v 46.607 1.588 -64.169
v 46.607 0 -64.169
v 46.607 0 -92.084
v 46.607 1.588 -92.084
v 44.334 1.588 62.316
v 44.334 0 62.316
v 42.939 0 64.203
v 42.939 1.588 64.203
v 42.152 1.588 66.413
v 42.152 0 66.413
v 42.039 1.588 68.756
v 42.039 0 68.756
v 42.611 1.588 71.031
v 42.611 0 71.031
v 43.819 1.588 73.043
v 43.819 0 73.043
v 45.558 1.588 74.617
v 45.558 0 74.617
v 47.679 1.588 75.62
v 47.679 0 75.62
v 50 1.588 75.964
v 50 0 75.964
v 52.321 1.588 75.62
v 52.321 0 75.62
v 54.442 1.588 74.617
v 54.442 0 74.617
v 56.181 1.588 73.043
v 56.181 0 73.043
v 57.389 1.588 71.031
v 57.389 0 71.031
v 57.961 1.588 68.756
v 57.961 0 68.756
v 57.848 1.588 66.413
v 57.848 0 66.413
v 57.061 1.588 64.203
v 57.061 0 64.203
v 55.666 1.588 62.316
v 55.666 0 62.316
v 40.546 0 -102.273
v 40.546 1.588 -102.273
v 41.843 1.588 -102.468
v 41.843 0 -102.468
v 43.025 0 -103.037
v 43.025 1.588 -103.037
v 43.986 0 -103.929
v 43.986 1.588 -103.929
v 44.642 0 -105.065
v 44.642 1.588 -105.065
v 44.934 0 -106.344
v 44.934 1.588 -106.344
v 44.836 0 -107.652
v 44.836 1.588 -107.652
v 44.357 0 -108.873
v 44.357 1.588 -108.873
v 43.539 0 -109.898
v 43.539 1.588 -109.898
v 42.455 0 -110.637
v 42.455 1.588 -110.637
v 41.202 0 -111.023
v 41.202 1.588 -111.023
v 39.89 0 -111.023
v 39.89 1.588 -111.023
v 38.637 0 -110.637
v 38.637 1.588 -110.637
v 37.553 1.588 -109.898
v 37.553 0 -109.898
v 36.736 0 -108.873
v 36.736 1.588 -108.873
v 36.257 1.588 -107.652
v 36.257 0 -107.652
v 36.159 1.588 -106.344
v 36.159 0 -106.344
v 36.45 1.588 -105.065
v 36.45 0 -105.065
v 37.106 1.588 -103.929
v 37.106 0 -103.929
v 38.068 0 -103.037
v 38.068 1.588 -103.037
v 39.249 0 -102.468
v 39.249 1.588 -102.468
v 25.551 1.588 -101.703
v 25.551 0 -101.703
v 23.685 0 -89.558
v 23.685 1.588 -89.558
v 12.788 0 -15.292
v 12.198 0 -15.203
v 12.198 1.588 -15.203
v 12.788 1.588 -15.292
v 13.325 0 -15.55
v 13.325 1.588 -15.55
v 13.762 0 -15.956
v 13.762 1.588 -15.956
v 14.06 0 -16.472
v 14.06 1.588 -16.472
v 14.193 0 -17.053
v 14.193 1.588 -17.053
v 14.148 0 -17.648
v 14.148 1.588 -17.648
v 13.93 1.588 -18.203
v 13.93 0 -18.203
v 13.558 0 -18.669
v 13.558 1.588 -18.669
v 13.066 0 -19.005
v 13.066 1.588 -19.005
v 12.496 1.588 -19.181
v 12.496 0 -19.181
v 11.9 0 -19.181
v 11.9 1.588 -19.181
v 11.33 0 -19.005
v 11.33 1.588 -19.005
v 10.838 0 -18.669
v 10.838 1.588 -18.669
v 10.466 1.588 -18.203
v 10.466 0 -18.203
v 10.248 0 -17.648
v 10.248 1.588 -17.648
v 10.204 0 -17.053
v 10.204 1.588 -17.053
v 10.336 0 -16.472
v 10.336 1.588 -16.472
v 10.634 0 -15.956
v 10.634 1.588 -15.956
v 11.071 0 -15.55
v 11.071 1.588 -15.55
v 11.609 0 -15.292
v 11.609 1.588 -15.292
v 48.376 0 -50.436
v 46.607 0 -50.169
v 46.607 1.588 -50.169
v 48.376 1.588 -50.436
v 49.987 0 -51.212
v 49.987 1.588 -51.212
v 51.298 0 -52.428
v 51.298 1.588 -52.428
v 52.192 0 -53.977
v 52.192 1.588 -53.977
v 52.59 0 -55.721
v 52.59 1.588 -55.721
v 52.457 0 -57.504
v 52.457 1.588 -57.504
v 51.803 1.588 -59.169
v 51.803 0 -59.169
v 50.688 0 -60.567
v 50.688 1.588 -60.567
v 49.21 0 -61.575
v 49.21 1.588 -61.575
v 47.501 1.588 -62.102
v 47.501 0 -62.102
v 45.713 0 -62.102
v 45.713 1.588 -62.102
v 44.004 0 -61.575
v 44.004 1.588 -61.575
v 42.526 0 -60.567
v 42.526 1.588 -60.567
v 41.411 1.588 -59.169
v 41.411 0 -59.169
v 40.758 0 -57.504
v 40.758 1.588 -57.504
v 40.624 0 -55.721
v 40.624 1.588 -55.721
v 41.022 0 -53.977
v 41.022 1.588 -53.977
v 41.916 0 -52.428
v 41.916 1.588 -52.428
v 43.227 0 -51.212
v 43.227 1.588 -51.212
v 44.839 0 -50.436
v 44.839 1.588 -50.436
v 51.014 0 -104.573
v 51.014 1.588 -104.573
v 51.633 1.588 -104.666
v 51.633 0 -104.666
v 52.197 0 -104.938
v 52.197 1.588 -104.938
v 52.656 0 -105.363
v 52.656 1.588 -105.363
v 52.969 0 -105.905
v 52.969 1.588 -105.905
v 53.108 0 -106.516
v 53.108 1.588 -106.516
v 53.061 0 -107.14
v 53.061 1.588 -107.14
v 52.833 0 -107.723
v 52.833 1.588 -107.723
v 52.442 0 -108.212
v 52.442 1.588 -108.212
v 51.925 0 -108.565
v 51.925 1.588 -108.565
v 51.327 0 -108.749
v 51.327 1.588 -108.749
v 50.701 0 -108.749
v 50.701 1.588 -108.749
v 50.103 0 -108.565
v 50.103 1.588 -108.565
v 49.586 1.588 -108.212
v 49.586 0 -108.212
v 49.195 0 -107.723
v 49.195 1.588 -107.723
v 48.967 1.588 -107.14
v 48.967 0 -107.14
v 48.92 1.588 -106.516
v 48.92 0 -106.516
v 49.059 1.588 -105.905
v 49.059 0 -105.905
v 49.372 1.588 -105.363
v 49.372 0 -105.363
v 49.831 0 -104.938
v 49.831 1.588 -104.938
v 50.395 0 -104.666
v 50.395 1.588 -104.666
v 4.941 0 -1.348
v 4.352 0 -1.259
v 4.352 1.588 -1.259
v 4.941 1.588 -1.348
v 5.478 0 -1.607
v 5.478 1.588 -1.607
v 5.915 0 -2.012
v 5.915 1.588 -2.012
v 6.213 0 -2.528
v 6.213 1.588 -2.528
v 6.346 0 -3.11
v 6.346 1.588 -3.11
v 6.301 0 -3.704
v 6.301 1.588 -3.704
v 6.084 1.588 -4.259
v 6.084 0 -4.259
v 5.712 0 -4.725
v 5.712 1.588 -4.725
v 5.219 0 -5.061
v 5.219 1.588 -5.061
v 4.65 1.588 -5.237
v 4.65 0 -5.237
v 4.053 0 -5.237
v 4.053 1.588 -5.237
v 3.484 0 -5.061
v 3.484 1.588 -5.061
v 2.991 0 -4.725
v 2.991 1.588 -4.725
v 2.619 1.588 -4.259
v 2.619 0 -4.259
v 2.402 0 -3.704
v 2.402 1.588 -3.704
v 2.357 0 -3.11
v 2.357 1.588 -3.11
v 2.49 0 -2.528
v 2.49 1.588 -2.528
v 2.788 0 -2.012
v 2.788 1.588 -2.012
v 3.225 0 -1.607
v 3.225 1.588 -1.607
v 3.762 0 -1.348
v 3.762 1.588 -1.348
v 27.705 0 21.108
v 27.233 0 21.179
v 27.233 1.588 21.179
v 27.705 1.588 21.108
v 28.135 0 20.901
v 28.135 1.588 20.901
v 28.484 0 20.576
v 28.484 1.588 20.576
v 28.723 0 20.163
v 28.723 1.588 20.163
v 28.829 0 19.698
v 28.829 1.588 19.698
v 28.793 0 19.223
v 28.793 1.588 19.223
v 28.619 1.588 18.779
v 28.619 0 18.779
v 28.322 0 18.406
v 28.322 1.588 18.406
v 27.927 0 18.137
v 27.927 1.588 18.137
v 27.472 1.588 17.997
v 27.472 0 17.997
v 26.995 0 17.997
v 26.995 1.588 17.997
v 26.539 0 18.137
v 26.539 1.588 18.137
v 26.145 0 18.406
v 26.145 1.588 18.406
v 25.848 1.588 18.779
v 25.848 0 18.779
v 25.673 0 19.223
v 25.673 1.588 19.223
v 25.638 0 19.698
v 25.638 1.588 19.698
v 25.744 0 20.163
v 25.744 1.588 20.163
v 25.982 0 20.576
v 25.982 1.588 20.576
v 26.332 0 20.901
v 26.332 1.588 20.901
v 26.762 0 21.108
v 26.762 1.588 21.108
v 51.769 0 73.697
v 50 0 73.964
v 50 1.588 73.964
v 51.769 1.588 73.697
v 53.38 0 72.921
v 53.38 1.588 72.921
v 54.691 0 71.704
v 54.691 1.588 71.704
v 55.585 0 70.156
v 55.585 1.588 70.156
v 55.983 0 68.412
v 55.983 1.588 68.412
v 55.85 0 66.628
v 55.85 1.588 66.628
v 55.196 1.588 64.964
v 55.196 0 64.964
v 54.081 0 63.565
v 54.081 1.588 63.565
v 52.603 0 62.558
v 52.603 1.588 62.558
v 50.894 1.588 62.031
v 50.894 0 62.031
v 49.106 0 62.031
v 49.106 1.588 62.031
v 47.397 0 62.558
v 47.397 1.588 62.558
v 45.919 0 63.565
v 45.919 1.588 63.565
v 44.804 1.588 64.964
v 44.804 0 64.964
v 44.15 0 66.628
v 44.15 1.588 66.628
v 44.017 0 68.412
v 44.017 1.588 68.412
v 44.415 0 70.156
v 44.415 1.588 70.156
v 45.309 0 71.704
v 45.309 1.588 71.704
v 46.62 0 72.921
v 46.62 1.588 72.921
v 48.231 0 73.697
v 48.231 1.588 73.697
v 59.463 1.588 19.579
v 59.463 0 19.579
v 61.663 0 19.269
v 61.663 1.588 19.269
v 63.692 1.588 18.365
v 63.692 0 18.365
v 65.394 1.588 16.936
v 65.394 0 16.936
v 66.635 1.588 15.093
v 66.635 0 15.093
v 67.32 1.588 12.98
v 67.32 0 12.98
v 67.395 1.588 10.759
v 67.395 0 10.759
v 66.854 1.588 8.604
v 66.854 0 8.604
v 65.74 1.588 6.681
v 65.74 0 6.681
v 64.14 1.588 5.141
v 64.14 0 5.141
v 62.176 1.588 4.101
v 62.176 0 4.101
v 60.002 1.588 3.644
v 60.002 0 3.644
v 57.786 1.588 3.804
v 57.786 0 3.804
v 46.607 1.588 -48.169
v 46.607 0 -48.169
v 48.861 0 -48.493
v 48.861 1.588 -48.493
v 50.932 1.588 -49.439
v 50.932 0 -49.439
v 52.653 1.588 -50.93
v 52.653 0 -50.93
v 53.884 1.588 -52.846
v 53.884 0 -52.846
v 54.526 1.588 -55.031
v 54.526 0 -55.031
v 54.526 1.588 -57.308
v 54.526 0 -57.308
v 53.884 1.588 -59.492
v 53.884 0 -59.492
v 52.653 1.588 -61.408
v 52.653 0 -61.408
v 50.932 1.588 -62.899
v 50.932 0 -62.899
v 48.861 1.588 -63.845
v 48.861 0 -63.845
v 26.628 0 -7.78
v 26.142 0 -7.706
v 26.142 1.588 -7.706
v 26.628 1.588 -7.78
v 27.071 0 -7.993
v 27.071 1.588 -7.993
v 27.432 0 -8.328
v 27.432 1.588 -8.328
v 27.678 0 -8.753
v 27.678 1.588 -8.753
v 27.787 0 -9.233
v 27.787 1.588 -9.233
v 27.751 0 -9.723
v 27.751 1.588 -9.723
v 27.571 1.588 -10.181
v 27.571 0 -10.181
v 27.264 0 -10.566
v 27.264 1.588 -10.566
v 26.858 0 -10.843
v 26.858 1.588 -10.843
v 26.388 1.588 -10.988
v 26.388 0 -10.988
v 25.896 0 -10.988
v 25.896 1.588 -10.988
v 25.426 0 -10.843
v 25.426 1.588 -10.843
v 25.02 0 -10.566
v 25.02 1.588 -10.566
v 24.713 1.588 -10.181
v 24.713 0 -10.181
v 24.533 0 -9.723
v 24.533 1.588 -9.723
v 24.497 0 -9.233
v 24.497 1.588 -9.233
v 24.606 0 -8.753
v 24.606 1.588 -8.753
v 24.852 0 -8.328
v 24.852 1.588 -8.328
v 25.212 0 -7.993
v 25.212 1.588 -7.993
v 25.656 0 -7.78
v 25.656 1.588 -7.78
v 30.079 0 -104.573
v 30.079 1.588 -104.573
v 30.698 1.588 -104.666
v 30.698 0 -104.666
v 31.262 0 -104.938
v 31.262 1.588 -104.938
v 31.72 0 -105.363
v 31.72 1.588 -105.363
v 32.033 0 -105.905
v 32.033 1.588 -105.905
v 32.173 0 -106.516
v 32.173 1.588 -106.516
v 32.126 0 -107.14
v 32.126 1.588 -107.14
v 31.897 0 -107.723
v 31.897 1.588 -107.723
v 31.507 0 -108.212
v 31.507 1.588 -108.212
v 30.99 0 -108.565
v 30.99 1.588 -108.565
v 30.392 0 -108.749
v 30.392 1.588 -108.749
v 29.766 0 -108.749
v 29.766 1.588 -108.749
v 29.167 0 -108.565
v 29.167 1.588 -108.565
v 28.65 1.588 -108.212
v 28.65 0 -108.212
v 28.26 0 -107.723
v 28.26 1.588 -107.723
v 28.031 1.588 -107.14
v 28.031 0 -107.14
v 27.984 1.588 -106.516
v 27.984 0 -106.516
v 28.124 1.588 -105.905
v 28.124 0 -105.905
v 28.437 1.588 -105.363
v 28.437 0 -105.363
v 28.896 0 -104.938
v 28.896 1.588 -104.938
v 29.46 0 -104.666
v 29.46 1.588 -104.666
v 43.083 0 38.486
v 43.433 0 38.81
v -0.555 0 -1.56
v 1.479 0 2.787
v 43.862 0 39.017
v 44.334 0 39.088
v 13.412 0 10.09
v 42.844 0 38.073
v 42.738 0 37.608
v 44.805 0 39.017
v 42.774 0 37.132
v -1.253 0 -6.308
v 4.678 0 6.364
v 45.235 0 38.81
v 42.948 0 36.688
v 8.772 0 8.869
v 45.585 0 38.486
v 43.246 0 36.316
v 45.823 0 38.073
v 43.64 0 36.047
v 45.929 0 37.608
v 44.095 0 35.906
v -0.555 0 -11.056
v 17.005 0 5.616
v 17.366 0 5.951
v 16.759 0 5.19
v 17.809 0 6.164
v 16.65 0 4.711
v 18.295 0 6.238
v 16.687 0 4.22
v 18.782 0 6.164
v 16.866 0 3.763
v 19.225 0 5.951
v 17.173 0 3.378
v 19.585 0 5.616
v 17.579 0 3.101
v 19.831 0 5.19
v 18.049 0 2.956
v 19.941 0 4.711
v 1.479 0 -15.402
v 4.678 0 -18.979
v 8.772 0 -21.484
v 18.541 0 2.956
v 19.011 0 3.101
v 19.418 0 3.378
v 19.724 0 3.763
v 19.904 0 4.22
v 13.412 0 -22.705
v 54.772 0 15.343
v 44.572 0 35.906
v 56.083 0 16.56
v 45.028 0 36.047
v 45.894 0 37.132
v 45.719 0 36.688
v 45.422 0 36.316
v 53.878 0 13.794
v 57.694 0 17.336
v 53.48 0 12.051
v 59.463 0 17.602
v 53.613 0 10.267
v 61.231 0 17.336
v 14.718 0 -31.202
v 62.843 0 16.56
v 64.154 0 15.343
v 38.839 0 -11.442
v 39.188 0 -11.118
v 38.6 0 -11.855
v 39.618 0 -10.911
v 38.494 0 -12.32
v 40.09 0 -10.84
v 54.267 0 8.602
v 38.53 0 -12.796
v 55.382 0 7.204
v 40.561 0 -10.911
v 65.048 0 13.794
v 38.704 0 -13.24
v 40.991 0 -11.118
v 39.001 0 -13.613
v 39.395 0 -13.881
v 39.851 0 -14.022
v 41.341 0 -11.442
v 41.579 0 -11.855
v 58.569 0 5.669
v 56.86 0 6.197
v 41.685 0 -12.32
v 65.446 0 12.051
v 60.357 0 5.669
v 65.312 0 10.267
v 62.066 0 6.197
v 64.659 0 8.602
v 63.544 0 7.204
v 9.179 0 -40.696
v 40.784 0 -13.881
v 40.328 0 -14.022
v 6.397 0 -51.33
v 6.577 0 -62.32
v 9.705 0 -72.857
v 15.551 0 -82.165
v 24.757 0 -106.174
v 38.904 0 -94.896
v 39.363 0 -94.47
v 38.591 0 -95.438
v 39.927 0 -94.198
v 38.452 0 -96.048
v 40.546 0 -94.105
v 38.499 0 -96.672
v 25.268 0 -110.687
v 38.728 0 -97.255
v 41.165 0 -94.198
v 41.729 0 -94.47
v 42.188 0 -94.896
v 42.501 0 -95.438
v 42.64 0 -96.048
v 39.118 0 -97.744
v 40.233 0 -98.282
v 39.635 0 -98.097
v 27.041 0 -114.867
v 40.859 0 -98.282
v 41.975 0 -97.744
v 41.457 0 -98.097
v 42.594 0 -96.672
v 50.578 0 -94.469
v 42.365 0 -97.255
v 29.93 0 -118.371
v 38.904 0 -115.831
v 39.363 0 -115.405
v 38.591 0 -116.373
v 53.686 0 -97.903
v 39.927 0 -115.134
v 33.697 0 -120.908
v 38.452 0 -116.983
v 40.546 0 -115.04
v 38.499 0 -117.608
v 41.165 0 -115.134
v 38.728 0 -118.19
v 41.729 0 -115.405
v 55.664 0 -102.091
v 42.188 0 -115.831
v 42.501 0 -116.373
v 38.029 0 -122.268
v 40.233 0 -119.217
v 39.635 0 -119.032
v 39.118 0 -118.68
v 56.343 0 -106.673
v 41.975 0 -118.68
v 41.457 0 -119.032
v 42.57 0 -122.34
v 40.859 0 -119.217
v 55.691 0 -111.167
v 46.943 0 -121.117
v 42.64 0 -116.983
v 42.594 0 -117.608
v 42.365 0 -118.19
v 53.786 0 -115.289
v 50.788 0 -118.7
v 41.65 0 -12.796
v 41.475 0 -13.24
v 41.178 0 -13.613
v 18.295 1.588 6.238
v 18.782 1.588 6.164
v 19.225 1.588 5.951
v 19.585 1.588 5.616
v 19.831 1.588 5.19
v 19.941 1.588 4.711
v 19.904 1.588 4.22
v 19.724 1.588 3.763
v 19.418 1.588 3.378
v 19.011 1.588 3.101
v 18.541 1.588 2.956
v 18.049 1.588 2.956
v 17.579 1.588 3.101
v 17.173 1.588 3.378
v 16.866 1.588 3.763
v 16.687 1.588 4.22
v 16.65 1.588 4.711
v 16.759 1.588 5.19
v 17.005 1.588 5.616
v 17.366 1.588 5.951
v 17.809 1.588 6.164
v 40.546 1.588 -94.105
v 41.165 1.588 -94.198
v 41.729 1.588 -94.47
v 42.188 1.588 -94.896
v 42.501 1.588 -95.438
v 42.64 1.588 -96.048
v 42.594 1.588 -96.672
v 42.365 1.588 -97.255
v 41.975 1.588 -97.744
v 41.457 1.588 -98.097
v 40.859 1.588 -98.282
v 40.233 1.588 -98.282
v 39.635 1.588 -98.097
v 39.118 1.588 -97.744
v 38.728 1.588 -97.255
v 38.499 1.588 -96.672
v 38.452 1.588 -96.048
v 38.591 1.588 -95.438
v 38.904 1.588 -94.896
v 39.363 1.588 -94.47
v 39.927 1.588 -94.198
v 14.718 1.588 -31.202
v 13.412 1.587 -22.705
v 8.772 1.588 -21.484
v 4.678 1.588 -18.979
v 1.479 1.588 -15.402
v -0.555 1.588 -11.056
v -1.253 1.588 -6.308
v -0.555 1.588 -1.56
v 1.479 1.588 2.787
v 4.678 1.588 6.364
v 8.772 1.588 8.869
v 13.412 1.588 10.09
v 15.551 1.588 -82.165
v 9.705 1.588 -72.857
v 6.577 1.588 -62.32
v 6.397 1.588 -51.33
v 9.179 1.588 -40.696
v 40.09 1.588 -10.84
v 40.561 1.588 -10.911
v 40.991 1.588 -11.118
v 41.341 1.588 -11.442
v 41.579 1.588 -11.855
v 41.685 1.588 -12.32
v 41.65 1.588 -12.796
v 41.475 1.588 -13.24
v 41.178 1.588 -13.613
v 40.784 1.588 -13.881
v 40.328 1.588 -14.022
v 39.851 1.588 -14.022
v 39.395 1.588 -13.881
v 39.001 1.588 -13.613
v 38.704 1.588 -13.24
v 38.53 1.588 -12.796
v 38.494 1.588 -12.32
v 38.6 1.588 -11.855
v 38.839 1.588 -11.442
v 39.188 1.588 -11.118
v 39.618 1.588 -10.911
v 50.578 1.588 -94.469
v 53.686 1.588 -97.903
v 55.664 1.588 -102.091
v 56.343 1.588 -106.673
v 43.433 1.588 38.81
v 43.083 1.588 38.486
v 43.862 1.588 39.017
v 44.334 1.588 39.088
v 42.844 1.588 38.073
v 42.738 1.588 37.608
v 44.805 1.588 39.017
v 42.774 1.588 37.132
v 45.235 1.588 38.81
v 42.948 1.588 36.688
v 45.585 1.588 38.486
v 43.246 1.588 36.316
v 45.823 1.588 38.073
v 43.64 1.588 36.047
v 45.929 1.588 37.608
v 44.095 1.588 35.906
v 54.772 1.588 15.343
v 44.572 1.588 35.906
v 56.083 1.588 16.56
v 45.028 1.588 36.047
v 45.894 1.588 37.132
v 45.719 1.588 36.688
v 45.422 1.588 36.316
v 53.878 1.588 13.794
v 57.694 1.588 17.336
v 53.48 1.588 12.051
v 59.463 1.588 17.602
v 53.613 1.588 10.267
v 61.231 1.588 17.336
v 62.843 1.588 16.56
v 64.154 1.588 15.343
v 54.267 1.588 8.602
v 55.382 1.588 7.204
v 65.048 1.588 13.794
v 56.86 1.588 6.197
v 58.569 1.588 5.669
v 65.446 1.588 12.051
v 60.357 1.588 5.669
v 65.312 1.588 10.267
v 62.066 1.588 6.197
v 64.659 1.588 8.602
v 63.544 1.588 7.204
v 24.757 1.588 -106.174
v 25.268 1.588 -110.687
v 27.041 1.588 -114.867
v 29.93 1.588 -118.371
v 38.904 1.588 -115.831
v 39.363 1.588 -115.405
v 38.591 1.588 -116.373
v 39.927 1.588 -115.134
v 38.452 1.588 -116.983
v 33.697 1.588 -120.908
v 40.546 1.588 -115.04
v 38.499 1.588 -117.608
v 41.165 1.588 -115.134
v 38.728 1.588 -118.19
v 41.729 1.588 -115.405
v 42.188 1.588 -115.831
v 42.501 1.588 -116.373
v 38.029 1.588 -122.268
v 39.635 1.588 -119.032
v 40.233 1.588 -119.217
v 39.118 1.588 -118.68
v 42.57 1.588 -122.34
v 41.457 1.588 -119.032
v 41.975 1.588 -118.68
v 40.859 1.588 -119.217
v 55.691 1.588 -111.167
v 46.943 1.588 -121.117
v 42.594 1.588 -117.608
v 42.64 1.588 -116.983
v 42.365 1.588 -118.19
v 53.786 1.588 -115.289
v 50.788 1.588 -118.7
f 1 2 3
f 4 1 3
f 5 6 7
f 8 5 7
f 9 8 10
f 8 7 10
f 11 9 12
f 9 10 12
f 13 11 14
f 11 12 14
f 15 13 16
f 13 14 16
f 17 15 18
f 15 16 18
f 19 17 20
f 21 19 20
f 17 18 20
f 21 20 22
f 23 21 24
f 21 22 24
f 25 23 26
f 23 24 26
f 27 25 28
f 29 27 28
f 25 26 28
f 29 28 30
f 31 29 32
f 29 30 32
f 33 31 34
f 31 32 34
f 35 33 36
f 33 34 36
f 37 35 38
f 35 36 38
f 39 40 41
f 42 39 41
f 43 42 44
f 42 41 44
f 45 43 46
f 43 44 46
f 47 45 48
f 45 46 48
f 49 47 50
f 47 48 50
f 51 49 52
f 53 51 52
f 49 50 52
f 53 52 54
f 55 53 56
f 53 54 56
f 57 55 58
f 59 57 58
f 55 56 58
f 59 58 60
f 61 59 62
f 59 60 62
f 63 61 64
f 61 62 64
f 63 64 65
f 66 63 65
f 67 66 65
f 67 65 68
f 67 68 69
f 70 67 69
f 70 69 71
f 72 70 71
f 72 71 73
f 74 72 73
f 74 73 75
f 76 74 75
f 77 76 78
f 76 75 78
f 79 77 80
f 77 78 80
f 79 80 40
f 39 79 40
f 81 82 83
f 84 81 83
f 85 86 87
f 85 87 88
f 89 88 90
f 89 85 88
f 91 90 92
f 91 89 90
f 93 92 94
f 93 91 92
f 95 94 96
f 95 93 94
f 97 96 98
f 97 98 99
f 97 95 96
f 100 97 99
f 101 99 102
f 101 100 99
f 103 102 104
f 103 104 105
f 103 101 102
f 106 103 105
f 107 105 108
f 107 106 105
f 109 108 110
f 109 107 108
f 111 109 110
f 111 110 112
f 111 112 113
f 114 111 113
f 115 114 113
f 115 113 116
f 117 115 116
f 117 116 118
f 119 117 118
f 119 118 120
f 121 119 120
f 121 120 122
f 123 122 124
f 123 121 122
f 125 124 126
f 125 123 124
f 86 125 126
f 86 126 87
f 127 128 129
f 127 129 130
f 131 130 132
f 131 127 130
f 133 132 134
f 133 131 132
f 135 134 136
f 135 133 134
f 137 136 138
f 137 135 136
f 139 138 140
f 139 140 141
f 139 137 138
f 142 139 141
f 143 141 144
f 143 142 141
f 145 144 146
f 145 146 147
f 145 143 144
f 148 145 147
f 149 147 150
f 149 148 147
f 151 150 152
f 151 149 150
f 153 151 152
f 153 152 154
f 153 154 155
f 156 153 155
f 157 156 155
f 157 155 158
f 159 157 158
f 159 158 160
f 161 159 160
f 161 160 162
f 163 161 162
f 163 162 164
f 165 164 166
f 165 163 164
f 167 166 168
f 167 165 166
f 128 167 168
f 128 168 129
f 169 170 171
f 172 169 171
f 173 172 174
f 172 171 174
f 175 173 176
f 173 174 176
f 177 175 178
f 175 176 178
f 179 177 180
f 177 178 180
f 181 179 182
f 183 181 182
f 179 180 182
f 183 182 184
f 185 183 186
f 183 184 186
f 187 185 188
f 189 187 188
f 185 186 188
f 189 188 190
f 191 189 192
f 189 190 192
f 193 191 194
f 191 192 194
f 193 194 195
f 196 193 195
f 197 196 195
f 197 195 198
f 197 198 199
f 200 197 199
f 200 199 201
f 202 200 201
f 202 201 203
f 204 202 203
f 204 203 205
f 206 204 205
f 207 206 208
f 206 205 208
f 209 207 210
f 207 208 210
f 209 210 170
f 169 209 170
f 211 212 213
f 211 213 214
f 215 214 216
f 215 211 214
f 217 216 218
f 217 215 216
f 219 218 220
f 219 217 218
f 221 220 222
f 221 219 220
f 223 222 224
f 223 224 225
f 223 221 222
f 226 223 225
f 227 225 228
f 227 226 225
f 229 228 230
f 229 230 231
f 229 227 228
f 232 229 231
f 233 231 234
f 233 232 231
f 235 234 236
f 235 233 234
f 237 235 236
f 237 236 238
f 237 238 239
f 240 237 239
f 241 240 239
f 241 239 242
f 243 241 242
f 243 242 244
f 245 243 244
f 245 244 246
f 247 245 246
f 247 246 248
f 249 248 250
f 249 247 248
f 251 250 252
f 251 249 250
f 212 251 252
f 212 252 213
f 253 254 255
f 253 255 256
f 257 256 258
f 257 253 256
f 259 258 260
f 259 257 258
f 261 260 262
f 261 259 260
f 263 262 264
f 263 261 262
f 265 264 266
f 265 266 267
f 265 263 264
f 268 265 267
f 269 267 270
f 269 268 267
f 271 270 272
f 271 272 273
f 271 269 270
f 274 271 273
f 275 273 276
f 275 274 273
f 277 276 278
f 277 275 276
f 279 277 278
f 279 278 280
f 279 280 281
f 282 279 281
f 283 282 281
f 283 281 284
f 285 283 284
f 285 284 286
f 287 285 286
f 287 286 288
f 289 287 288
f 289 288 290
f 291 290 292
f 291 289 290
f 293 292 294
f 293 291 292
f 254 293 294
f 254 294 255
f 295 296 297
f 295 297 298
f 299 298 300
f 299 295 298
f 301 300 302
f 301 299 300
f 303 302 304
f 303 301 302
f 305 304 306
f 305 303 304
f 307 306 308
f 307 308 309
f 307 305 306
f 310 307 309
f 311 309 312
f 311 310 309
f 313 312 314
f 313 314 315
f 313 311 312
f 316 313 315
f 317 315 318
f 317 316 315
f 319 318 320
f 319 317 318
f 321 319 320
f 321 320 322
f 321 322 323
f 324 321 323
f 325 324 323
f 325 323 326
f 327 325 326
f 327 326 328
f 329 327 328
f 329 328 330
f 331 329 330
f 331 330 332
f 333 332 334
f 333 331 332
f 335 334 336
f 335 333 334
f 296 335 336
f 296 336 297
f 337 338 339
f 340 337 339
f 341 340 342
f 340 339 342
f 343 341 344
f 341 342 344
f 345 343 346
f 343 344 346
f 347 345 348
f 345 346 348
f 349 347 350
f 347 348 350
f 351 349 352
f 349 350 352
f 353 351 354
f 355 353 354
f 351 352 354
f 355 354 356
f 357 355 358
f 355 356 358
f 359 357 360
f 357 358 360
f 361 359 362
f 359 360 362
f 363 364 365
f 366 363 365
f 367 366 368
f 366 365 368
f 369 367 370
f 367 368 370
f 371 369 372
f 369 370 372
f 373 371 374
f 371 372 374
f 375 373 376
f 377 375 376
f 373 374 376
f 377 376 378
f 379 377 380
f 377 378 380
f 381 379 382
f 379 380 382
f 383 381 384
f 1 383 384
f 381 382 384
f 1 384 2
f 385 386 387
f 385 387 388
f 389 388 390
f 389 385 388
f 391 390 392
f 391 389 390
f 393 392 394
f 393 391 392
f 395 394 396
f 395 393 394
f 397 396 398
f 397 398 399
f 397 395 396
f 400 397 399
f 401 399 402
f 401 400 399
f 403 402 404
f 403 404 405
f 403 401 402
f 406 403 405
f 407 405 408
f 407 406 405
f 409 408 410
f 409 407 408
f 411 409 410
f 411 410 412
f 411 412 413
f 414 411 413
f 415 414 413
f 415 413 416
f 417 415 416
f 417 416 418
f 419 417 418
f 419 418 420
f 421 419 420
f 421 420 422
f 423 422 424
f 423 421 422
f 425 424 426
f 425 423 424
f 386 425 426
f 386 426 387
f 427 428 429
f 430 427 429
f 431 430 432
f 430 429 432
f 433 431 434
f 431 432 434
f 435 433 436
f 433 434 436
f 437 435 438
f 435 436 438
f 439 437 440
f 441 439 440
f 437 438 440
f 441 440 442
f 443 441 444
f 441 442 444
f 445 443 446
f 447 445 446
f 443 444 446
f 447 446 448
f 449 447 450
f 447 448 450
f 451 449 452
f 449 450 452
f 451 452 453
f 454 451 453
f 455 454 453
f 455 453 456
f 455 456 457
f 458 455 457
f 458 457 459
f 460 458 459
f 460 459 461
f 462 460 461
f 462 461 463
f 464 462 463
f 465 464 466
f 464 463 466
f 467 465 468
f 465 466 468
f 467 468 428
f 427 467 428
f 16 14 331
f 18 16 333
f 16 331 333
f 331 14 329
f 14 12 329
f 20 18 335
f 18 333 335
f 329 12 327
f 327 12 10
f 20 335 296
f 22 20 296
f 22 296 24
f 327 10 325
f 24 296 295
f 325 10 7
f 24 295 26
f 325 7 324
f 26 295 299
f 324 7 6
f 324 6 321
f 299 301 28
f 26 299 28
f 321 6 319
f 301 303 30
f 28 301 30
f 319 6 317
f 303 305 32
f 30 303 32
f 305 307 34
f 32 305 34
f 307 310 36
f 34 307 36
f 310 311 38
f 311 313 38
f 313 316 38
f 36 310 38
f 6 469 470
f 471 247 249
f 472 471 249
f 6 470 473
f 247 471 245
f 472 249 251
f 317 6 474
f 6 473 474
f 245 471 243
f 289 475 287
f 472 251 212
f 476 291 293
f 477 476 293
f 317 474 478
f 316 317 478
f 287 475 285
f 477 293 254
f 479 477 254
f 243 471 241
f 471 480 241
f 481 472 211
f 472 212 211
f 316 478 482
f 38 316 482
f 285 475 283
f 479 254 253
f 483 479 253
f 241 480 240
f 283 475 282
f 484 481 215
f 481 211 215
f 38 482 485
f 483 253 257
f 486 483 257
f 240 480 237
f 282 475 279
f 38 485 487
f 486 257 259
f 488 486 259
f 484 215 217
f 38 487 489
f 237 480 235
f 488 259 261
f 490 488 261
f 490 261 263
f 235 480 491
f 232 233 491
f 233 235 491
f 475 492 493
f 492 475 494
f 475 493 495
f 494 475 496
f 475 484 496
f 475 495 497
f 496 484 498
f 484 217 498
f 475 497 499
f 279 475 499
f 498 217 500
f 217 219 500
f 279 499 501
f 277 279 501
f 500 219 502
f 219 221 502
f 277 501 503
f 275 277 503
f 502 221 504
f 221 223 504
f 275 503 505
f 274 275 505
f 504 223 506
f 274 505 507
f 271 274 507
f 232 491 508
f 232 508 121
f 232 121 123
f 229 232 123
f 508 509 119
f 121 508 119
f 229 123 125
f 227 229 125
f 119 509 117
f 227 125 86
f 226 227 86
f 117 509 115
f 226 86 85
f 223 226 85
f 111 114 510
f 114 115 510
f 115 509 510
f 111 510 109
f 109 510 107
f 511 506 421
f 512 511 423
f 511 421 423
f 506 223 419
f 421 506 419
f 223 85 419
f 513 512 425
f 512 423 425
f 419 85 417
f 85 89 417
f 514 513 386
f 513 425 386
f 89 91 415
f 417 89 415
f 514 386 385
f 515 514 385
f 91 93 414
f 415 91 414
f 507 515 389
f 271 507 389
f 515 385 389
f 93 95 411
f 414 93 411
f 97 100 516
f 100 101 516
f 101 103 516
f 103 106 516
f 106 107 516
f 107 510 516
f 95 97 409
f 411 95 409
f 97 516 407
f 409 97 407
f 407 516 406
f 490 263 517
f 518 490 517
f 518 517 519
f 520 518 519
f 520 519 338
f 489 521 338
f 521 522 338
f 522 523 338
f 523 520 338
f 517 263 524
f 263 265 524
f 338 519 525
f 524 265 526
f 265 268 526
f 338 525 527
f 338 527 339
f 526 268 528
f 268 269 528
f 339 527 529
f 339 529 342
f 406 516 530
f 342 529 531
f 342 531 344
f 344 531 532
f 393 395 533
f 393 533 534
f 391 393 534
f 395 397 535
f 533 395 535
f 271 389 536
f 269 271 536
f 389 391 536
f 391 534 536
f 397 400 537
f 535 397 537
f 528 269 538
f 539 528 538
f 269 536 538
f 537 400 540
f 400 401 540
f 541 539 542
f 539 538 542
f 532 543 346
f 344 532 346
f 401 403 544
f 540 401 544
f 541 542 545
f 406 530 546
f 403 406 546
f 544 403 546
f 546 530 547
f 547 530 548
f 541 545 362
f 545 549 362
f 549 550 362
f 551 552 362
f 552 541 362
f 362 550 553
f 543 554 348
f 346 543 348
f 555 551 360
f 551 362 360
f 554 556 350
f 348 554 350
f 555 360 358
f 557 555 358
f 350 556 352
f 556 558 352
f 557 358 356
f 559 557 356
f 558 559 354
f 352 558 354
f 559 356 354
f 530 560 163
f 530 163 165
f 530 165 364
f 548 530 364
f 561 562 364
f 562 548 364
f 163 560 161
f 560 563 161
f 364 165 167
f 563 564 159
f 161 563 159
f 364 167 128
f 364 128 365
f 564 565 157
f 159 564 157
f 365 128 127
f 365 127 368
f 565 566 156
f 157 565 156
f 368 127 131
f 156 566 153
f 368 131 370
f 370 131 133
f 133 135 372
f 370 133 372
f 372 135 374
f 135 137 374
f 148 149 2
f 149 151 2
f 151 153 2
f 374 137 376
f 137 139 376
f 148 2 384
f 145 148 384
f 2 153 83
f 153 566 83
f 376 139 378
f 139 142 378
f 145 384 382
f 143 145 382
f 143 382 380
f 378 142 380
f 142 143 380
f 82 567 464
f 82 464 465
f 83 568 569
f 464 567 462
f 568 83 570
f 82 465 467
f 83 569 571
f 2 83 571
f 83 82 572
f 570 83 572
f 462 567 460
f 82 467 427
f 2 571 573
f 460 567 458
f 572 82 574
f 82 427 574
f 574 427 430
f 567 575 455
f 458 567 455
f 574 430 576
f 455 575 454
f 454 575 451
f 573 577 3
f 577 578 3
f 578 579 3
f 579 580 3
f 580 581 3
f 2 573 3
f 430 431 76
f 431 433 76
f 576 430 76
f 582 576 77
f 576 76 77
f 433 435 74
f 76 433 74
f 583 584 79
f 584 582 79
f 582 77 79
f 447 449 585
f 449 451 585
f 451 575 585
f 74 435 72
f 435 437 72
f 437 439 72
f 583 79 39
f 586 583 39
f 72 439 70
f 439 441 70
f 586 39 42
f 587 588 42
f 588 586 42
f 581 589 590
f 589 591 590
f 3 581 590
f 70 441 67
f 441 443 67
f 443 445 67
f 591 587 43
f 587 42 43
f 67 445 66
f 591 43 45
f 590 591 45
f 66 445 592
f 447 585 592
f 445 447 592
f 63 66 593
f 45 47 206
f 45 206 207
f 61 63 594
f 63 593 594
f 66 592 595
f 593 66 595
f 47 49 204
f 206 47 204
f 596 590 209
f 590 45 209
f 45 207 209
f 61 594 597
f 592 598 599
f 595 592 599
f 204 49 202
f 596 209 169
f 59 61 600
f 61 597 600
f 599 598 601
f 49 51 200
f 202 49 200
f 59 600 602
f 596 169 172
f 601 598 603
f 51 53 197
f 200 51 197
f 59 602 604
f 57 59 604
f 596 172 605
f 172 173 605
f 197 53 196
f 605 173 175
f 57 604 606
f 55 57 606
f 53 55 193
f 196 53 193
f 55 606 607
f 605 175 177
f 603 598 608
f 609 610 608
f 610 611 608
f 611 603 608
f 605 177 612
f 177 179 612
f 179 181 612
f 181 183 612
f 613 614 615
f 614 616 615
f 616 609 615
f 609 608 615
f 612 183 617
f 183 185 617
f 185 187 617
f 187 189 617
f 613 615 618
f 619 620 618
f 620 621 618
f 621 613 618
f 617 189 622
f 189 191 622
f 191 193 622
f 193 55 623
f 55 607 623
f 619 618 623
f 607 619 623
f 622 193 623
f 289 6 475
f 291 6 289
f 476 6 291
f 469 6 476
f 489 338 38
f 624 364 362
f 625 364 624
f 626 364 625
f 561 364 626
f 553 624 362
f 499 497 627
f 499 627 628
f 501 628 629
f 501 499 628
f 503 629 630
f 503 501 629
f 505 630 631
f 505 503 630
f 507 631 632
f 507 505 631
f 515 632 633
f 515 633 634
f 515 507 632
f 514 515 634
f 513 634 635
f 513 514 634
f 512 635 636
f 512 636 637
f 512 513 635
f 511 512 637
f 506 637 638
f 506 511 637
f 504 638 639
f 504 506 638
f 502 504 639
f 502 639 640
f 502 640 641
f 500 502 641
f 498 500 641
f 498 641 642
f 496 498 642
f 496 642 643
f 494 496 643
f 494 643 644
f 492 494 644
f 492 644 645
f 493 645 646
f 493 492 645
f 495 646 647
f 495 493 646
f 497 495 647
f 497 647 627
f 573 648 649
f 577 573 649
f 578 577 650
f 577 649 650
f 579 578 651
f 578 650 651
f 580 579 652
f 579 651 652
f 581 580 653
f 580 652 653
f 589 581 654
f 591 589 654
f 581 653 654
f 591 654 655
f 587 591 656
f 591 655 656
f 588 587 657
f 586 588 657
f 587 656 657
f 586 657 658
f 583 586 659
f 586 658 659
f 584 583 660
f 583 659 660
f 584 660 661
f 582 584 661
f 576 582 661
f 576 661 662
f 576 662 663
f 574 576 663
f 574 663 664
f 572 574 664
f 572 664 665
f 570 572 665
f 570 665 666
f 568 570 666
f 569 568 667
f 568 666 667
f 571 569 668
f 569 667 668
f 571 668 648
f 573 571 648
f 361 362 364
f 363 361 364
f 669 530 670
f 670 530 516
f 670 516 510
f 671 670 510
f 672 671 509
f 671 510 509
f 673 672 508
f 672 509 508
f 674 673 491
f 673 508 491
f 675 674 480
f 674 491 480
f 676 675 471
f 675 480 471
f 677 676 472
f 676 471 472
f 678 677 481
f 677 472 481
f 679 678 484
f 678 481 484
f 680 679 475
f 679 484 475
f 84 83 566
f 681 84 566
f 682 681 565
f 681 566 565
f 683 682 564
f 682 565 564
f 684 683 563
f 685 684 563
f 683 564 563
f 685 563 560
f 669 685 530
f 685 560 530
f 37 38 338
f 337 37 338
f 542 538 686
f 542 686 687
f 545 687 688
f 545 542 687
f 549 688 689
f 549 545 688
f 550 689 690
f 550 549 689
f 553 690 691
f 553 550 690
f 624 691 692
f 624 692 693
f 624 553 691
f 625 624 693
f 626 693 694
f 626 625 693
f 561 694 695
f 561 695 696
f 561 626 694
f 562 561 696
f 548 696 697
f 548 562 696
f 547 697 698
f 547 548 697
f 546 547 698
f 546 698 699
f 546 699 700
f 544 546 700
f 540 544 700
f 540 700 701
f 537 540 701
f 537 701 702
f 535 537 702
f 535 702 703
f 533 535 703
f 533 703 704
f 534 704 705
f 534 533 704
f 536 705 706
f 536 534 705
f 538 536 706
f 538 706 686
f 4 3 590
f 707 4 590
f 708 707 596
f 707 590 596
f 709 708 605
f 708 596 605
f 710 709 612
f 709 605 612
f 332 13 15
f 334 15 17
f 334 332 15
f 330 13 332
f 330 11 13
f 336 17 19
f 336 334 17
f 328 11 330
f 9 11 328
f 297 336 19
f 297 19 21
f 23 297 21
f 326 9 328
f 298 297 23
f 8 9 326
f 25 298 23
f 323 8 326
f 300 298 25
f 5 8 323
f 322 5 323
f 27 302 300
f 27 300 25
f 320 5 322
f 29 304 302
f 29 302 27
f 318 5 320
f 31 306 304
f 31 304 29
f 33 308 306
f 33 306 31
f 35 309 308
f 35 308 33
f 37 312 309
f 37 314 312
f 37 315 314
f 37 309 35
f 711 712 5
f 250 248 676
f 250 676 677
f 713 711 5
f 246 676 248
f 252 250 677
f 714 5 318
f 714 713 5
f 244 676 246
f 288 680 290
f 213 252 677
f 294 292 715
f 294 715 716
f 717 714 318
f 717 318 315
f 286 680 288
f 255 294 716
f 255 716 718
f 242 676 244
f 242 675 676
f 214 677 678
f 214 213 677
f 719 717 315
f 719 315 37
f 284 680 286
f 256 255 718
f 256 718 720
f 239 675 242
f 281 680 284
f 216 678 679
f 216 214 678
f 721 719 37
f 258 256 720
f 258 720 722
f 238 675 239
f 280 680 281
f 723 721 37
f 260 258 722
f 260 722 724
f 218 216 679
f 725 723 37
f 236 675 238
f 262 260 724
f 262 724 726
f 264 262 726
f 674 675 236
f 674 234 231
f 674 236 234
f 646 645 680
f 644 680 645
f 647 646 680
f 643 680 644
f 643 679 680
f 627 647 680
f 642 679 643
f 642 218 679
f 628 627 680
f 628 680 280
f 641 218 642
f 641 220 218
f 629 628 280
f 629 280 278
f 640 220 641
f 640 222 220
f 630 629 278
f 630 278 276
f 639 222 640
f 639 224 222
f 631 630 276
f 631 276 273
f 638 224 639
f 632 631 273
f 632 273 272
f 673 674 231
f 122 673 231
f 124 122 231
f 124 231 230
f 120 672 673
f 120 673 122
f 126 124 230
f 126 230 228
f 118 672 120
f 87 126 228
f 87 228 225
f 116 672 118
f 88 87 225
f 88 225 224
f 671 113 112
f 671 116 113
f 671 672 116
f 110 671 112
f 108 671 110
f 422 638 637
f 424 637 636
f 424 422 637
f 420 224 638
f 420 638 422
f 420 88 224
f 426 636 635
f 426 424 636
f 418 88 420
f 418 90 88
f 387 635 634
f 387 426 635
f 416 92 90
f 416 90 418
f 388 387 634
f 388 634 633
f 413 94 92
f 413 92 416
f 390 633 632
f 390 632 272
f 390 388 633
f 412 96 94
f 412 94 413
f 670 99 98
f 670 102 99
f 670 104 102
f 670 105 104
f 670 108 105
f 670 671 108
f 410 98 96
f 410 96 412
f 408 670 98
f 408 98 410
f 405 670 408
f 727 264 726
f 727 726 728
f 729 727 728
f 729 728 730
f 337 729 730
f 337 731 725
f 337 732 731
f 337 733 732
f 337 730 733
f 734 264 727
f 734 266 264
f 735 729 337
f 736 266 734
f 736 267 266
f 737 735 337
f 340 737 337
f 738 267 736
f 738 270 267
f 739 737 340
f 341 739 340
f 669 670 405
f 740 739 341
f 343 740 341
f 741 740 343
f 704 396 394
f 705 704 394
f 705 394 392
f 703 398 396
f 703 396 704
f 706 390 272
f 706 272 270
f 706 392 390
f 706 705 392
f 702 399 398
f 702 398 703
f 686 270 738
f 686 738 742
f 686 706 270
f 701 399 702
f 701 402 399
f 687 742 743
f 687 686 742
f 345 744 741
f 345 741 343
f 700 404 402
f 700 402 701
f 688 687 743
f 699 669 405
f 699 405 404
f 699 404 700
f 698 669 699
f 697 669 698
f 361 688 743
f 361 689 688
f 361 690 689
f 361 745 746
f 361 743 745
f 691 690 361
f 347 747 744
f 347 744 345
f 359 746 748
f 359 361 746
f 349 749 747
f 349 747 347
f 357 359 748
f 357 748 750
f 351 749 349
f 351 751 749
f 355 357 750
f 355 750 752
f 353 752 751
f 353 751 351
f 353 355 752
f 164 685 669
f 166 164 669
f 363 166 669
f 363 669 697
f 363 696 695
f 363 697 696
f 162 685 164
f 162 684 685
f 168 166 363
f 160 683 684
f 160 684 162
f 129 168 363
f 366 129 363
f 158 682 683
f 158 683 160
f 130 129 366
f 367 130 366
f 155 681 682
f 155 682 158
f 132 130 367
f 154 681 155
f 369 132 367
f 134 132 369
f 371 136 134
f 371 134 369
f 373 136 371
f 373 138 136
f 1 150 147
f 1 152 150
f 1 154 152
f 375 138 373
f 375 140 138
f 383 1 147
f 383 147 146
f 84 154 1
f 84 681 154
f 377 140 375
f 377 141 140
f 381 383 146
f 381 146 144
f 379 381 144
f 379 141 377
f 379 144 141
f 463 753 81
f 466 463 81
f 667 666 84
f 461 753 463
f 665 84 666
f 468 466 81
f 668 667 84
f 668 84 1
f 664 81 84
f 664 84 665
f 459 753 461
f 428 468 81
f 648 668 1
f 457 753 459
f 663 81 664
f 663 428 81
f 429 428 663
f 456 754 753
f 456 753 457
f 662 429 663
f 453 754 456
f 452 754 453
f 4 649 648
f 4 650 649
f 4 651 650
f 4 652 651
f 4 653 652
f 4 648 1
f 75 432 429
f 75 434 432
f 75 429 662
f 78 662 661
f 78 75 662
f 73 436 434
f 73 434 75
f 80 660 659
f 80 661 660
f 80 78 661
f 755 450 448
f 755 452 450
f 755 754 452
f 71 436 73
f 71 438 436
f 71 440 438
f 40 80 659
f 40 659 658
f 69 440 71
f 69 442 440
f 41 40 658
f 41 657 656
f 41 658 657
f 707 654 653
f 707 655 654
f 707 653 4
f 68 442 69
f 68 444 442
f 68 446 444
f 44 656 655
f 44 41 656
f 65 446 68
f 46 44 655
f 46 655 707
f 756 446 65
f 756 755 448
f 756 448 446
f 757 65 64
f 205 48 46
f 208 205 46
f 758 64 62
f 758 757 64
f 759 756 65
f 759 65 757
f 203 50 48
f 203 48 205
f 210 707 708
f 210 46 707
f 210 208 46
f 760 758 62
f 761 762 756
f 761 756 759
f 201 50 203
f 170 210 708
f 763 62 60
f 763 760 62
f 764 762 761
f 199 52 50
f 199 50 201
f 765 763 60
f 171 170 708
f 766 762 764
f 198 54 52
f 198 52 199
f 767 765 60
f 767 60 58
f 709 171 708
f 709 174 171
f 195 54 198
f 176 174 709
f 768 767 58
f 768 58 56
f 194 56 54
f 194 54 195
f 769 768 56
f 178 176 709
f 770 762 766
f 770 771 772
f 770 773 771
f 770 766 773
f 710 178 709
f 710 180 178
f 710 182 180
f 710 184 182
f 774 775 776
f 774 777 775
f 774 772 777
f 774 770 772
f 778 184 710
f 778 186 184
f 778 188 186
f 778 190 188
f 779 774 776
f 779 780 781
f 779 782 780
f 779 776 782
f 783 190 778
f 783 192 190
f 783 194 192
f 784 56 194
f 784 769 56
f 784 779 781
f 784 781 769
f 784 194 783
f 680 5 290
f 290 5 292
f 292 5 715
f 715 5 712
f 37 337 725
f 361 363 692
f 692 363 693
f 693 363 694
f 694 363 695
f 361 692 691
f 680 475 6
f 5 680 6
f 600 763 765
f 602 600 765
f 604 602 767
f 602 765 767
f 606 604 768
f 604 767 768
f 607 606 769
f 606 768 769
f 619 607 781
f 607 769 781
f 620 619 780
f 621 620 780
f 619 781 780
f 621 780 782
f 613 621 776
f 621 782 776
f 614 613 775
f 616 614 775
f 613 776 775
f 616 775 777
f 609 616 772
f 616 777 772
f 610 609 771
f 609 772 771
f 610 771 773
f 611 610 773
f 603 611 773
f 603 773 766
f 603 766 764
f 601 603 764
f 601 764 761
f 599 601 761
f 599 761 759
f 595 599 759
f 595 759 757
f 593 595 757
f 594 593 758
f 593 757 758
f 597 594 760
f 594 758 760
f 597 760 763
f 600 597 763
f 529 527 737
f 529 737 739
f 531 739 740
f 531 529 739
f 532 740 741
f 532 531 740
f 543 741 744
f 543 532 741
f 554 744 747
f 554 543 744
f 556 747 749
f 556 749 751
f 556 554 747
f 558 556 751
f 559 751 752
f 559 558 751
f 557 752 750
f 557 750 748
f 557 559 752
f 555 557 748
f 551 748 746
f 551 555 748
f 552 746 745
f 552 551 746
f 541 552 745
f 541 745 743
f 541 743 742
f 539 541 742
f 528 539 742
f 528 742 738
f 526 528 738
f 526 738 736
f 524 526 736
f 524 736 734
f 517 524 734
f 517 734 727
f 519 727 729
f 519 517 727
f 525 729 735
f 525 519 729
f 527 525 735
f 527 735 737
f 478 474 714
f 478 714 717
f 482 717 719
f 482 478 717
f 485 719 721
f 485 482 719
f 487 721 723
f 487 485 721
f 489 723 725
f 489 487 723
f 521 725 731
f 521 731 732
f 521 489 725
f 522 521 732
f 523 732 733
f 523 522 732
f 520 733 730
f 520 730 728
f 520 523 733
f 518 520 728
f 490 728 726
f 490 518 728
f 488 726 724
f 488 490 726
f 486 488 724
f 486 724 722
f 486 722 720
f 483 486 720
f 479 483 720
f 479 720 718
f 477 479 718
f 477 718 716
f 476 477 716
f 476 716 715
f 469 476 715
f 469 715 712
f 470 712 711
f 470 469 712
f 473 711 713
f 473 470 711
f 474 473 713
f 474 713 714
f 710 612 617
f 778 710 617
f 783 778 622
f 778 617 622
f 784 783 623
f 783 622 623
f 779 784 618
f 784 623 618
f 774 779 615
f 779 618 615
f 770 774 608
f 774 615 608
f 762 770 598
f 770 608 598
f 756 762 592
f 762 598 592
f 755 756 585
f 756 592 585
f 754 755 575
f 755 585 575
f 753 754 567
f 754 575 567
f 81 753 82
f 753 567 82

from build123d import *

# Parameters (mm, degrees)
SKETCH1_R           = 1.6
SKETCH1_R_2         = 2
SKETCH1_R_3         = 1.65
SKETCH1_R_4         = 6
BOSS_EXTRUDE2_DEPTH = 1.5875
BOSS_EXTRUDE3_START = -1.5875
BOSS_EXTRUDE3_DEPTH = 1.5875
SKETCH4_R           = 4.4
SKETCH4_R_2         = 2.1
CUT_EXTRUDE1_DEPTH  = 1.5875


with BuildPart() as part:
    # Sketch1 → Boss-Extrude2 (new body)
    with BuildSketch(Plane(origin=(0, 0, 0), x_dir=(1, 0, 0), z_dir=(0, 1, 0))):
        with BuildLine():
            Line((57.785577921, -3.804263015), (46.607089569, 48.169037391))
            ThreePointArc((46.607089569, 48.169037391), (54.607089569, 56.169037391), (46.607089569, 64.169037391))
            Line((46.607089569, 64.169037391), (46.607089569, 96.669037391))
            ThreePointArc((46.607089569, 96.669037391), (9.774896481, 73.010639225), (15.974342375, 29.675928865))
            Line((15.974342375, 29.675928865), (13.412399058, 22.705365919))
            ThreePointArc((13.412399058, 22.705365919), (-1.253243965, 6.307648563), (13.412399058, -10.090068793))
            Line((13.412399058, -10.090068793), (44.33382846, -62.316035804))
            ThreePointArc((44.33382846, -62.316035804), (50, -75.963557391), (55.66617154, -62.316035804))
            Line((55.66617154, -62.316035804), (59.462816555, -19.578912916))
            ThreePointArc((59.462816555, -19.578912916), (67.394599283, -10.759075533), (57.785577921, -3.804263015))
        make_face()
        with Locations(Location((27.233234802, -19.578912916, 0), (0, 0, 270))):
            Circle(SKETCH1_R, mode=Mode.SUBTRACT)
        with Locations(Location((44.33382846, -37.488387538, 0), (0, 0, 270))):
            Circle(SKETCH1_R, mode=Mode.SUBTRACT)
        with Locations(Location((40.089632361, 12.439739227, 0), (0, 0, 270))):
            Circle(SKETCH1_R, mode=Mode.SUBTRACT)
        with Locations(Location((12.19812376, 17.202869591, 0), (0, 0, 270))):
            Circle(SKETCH1_R_2, mode=Mode.SUBTRACT)
        with Locations(Location((26.141977063, 9.356280839, 0), (0, 0, 270))):
            Circle(SKETCH1_R_3, mode=Mode.SUBTRACT)
        with Locations(Location((4.351535007, 3.259016288, 0), (0, 0, 270))):
            Circle(SKETCH1_R_2, mode=Mode.SUBTRACT)
        with Locations(Location((18.295388311, -4.587572465, 0), (0, 0, 270))):
            Circle(SKETCH1_R_3, mode=Mode.SUBTRACT)
        with Locations(Location((46.607089569, 56.169037391, 0), (0, 0, 270))):
            Circle(SKETCH1_R_4, mode=Mode.SUBTRACT)
        with Locations(Location((59.462816555, -11.60242182, 0), (0, 0, 270))):
            Circle(SKETCH1_R_4, mode=Mode.SUBTRACT)
        with Locations(Location((50, -67.963557391, 0), (0, 0, 270))):
            Circle(SKETCH1_R_4, mode=Mode.SUBTRACT)
    extrude(amount=BOSS_EXTRUDE2_DEPTH)

    # Sketch3 → Boss-Extrude3 (add)
    with BuildSketch(Plane(origin=(0, 1.5875, 0), x_dir=(1, 0, 0), z_dir=(0, 1, 0)).offset(BOSS_EXTRUDE3_START)):
        with BuildLine():
            ThreePointArc((56.343437375, 106.672616503), (38.029280092, 122.267991205), (25.551142047, 101.702968958))
            ThreePointArc((25.551142047, 101.702968958), (27.87263843, 97.242332074), (31.478334129, 93.737252132))
            ThreePointArc((31.478334129, 93.737252132), (38.901984022, 95.929336038), (46.607089569, 96.669037391))
            Line((46.607089569, 96.669037391), (46.607089569, 92.08436081))
            ThreePointArc((46.607089569, 92.08436081), (53.685796044, 97.903157102), (56.343437375, 106.672616503))
        make_face()
        with BuildLine():
            ThreePointArc((46.607089569, 96.669037391), (38.901984022, 95.929336038), (31.478334129, 93.737252132))
            ThreePointArc((31.478334129, 93.737252132), (38.83054718, 90.968883646), (46.607089569, 92.08436081))
            Line((46.607089569, 92.08436081), (46.607089569, 96.669037391))
        make_face()
        with BuildLine():
            Line((25.551142047, 101.702968958), (23.684957519, 89.558045497))
            ThreePointArc((23.684957519, 89.558045497), (27.467237121, 91.860997946), (31.478334129, 93.737252132))
            ThreePointArc((31.478334129, 93.737252132), (27.87263843, 97.242332074), (25.551142047, 101.702968958))
        make_face()
        with BuildLine():
            Line((14.718034312, 31.202296417), (13.412399058, 22.705365919))
            Line((13.412399058, 22.705365919), (15.974342375, 29.675928865))
            ThreePointArc((15.974342375, 29.675928865), (15.33687379, 30.431446107), (14.718034312, 31.202296417))
        make_face()
    extrude(amount=BOSS_EXTRUDE3_DEPTH)

    # Sketch4 → Cut-Extrude1 (cut)
    with BuildSketch(Plane(origin=(0, 1.5875, 0), x_dir=(1, 0, 0), z_dir=(0, 1, 0))):
        with Locations(Location((40.546257627, 106.672616503, 0), (0, 0, 270))):
            Circle(SKETCH4_R)
        with Locations(Location((40.546257627, 117.14024961, 0), (0, 0, 270))):
            Circle(SKETCH4_R_2)
        with Locations(Location((30.07862452, 106.672616503, 0), (0, 0, 270))):
            Circle(SKETCH4_R_2)
        with Locations(Location((51.013890734, 106.672616503, 0), (0, 0, 270))):
            Circle(SKETCH4_R_2)
        with Locations(Location((40.546257627, 96.204983396, 0), (0, 0, 270))):
            Circle(SKETCH4_R_2)
    extrude(amount=-CUT_EXTRUDE1_DEPTH, mode=Mode.SUBTRACT)


solid = part.part
